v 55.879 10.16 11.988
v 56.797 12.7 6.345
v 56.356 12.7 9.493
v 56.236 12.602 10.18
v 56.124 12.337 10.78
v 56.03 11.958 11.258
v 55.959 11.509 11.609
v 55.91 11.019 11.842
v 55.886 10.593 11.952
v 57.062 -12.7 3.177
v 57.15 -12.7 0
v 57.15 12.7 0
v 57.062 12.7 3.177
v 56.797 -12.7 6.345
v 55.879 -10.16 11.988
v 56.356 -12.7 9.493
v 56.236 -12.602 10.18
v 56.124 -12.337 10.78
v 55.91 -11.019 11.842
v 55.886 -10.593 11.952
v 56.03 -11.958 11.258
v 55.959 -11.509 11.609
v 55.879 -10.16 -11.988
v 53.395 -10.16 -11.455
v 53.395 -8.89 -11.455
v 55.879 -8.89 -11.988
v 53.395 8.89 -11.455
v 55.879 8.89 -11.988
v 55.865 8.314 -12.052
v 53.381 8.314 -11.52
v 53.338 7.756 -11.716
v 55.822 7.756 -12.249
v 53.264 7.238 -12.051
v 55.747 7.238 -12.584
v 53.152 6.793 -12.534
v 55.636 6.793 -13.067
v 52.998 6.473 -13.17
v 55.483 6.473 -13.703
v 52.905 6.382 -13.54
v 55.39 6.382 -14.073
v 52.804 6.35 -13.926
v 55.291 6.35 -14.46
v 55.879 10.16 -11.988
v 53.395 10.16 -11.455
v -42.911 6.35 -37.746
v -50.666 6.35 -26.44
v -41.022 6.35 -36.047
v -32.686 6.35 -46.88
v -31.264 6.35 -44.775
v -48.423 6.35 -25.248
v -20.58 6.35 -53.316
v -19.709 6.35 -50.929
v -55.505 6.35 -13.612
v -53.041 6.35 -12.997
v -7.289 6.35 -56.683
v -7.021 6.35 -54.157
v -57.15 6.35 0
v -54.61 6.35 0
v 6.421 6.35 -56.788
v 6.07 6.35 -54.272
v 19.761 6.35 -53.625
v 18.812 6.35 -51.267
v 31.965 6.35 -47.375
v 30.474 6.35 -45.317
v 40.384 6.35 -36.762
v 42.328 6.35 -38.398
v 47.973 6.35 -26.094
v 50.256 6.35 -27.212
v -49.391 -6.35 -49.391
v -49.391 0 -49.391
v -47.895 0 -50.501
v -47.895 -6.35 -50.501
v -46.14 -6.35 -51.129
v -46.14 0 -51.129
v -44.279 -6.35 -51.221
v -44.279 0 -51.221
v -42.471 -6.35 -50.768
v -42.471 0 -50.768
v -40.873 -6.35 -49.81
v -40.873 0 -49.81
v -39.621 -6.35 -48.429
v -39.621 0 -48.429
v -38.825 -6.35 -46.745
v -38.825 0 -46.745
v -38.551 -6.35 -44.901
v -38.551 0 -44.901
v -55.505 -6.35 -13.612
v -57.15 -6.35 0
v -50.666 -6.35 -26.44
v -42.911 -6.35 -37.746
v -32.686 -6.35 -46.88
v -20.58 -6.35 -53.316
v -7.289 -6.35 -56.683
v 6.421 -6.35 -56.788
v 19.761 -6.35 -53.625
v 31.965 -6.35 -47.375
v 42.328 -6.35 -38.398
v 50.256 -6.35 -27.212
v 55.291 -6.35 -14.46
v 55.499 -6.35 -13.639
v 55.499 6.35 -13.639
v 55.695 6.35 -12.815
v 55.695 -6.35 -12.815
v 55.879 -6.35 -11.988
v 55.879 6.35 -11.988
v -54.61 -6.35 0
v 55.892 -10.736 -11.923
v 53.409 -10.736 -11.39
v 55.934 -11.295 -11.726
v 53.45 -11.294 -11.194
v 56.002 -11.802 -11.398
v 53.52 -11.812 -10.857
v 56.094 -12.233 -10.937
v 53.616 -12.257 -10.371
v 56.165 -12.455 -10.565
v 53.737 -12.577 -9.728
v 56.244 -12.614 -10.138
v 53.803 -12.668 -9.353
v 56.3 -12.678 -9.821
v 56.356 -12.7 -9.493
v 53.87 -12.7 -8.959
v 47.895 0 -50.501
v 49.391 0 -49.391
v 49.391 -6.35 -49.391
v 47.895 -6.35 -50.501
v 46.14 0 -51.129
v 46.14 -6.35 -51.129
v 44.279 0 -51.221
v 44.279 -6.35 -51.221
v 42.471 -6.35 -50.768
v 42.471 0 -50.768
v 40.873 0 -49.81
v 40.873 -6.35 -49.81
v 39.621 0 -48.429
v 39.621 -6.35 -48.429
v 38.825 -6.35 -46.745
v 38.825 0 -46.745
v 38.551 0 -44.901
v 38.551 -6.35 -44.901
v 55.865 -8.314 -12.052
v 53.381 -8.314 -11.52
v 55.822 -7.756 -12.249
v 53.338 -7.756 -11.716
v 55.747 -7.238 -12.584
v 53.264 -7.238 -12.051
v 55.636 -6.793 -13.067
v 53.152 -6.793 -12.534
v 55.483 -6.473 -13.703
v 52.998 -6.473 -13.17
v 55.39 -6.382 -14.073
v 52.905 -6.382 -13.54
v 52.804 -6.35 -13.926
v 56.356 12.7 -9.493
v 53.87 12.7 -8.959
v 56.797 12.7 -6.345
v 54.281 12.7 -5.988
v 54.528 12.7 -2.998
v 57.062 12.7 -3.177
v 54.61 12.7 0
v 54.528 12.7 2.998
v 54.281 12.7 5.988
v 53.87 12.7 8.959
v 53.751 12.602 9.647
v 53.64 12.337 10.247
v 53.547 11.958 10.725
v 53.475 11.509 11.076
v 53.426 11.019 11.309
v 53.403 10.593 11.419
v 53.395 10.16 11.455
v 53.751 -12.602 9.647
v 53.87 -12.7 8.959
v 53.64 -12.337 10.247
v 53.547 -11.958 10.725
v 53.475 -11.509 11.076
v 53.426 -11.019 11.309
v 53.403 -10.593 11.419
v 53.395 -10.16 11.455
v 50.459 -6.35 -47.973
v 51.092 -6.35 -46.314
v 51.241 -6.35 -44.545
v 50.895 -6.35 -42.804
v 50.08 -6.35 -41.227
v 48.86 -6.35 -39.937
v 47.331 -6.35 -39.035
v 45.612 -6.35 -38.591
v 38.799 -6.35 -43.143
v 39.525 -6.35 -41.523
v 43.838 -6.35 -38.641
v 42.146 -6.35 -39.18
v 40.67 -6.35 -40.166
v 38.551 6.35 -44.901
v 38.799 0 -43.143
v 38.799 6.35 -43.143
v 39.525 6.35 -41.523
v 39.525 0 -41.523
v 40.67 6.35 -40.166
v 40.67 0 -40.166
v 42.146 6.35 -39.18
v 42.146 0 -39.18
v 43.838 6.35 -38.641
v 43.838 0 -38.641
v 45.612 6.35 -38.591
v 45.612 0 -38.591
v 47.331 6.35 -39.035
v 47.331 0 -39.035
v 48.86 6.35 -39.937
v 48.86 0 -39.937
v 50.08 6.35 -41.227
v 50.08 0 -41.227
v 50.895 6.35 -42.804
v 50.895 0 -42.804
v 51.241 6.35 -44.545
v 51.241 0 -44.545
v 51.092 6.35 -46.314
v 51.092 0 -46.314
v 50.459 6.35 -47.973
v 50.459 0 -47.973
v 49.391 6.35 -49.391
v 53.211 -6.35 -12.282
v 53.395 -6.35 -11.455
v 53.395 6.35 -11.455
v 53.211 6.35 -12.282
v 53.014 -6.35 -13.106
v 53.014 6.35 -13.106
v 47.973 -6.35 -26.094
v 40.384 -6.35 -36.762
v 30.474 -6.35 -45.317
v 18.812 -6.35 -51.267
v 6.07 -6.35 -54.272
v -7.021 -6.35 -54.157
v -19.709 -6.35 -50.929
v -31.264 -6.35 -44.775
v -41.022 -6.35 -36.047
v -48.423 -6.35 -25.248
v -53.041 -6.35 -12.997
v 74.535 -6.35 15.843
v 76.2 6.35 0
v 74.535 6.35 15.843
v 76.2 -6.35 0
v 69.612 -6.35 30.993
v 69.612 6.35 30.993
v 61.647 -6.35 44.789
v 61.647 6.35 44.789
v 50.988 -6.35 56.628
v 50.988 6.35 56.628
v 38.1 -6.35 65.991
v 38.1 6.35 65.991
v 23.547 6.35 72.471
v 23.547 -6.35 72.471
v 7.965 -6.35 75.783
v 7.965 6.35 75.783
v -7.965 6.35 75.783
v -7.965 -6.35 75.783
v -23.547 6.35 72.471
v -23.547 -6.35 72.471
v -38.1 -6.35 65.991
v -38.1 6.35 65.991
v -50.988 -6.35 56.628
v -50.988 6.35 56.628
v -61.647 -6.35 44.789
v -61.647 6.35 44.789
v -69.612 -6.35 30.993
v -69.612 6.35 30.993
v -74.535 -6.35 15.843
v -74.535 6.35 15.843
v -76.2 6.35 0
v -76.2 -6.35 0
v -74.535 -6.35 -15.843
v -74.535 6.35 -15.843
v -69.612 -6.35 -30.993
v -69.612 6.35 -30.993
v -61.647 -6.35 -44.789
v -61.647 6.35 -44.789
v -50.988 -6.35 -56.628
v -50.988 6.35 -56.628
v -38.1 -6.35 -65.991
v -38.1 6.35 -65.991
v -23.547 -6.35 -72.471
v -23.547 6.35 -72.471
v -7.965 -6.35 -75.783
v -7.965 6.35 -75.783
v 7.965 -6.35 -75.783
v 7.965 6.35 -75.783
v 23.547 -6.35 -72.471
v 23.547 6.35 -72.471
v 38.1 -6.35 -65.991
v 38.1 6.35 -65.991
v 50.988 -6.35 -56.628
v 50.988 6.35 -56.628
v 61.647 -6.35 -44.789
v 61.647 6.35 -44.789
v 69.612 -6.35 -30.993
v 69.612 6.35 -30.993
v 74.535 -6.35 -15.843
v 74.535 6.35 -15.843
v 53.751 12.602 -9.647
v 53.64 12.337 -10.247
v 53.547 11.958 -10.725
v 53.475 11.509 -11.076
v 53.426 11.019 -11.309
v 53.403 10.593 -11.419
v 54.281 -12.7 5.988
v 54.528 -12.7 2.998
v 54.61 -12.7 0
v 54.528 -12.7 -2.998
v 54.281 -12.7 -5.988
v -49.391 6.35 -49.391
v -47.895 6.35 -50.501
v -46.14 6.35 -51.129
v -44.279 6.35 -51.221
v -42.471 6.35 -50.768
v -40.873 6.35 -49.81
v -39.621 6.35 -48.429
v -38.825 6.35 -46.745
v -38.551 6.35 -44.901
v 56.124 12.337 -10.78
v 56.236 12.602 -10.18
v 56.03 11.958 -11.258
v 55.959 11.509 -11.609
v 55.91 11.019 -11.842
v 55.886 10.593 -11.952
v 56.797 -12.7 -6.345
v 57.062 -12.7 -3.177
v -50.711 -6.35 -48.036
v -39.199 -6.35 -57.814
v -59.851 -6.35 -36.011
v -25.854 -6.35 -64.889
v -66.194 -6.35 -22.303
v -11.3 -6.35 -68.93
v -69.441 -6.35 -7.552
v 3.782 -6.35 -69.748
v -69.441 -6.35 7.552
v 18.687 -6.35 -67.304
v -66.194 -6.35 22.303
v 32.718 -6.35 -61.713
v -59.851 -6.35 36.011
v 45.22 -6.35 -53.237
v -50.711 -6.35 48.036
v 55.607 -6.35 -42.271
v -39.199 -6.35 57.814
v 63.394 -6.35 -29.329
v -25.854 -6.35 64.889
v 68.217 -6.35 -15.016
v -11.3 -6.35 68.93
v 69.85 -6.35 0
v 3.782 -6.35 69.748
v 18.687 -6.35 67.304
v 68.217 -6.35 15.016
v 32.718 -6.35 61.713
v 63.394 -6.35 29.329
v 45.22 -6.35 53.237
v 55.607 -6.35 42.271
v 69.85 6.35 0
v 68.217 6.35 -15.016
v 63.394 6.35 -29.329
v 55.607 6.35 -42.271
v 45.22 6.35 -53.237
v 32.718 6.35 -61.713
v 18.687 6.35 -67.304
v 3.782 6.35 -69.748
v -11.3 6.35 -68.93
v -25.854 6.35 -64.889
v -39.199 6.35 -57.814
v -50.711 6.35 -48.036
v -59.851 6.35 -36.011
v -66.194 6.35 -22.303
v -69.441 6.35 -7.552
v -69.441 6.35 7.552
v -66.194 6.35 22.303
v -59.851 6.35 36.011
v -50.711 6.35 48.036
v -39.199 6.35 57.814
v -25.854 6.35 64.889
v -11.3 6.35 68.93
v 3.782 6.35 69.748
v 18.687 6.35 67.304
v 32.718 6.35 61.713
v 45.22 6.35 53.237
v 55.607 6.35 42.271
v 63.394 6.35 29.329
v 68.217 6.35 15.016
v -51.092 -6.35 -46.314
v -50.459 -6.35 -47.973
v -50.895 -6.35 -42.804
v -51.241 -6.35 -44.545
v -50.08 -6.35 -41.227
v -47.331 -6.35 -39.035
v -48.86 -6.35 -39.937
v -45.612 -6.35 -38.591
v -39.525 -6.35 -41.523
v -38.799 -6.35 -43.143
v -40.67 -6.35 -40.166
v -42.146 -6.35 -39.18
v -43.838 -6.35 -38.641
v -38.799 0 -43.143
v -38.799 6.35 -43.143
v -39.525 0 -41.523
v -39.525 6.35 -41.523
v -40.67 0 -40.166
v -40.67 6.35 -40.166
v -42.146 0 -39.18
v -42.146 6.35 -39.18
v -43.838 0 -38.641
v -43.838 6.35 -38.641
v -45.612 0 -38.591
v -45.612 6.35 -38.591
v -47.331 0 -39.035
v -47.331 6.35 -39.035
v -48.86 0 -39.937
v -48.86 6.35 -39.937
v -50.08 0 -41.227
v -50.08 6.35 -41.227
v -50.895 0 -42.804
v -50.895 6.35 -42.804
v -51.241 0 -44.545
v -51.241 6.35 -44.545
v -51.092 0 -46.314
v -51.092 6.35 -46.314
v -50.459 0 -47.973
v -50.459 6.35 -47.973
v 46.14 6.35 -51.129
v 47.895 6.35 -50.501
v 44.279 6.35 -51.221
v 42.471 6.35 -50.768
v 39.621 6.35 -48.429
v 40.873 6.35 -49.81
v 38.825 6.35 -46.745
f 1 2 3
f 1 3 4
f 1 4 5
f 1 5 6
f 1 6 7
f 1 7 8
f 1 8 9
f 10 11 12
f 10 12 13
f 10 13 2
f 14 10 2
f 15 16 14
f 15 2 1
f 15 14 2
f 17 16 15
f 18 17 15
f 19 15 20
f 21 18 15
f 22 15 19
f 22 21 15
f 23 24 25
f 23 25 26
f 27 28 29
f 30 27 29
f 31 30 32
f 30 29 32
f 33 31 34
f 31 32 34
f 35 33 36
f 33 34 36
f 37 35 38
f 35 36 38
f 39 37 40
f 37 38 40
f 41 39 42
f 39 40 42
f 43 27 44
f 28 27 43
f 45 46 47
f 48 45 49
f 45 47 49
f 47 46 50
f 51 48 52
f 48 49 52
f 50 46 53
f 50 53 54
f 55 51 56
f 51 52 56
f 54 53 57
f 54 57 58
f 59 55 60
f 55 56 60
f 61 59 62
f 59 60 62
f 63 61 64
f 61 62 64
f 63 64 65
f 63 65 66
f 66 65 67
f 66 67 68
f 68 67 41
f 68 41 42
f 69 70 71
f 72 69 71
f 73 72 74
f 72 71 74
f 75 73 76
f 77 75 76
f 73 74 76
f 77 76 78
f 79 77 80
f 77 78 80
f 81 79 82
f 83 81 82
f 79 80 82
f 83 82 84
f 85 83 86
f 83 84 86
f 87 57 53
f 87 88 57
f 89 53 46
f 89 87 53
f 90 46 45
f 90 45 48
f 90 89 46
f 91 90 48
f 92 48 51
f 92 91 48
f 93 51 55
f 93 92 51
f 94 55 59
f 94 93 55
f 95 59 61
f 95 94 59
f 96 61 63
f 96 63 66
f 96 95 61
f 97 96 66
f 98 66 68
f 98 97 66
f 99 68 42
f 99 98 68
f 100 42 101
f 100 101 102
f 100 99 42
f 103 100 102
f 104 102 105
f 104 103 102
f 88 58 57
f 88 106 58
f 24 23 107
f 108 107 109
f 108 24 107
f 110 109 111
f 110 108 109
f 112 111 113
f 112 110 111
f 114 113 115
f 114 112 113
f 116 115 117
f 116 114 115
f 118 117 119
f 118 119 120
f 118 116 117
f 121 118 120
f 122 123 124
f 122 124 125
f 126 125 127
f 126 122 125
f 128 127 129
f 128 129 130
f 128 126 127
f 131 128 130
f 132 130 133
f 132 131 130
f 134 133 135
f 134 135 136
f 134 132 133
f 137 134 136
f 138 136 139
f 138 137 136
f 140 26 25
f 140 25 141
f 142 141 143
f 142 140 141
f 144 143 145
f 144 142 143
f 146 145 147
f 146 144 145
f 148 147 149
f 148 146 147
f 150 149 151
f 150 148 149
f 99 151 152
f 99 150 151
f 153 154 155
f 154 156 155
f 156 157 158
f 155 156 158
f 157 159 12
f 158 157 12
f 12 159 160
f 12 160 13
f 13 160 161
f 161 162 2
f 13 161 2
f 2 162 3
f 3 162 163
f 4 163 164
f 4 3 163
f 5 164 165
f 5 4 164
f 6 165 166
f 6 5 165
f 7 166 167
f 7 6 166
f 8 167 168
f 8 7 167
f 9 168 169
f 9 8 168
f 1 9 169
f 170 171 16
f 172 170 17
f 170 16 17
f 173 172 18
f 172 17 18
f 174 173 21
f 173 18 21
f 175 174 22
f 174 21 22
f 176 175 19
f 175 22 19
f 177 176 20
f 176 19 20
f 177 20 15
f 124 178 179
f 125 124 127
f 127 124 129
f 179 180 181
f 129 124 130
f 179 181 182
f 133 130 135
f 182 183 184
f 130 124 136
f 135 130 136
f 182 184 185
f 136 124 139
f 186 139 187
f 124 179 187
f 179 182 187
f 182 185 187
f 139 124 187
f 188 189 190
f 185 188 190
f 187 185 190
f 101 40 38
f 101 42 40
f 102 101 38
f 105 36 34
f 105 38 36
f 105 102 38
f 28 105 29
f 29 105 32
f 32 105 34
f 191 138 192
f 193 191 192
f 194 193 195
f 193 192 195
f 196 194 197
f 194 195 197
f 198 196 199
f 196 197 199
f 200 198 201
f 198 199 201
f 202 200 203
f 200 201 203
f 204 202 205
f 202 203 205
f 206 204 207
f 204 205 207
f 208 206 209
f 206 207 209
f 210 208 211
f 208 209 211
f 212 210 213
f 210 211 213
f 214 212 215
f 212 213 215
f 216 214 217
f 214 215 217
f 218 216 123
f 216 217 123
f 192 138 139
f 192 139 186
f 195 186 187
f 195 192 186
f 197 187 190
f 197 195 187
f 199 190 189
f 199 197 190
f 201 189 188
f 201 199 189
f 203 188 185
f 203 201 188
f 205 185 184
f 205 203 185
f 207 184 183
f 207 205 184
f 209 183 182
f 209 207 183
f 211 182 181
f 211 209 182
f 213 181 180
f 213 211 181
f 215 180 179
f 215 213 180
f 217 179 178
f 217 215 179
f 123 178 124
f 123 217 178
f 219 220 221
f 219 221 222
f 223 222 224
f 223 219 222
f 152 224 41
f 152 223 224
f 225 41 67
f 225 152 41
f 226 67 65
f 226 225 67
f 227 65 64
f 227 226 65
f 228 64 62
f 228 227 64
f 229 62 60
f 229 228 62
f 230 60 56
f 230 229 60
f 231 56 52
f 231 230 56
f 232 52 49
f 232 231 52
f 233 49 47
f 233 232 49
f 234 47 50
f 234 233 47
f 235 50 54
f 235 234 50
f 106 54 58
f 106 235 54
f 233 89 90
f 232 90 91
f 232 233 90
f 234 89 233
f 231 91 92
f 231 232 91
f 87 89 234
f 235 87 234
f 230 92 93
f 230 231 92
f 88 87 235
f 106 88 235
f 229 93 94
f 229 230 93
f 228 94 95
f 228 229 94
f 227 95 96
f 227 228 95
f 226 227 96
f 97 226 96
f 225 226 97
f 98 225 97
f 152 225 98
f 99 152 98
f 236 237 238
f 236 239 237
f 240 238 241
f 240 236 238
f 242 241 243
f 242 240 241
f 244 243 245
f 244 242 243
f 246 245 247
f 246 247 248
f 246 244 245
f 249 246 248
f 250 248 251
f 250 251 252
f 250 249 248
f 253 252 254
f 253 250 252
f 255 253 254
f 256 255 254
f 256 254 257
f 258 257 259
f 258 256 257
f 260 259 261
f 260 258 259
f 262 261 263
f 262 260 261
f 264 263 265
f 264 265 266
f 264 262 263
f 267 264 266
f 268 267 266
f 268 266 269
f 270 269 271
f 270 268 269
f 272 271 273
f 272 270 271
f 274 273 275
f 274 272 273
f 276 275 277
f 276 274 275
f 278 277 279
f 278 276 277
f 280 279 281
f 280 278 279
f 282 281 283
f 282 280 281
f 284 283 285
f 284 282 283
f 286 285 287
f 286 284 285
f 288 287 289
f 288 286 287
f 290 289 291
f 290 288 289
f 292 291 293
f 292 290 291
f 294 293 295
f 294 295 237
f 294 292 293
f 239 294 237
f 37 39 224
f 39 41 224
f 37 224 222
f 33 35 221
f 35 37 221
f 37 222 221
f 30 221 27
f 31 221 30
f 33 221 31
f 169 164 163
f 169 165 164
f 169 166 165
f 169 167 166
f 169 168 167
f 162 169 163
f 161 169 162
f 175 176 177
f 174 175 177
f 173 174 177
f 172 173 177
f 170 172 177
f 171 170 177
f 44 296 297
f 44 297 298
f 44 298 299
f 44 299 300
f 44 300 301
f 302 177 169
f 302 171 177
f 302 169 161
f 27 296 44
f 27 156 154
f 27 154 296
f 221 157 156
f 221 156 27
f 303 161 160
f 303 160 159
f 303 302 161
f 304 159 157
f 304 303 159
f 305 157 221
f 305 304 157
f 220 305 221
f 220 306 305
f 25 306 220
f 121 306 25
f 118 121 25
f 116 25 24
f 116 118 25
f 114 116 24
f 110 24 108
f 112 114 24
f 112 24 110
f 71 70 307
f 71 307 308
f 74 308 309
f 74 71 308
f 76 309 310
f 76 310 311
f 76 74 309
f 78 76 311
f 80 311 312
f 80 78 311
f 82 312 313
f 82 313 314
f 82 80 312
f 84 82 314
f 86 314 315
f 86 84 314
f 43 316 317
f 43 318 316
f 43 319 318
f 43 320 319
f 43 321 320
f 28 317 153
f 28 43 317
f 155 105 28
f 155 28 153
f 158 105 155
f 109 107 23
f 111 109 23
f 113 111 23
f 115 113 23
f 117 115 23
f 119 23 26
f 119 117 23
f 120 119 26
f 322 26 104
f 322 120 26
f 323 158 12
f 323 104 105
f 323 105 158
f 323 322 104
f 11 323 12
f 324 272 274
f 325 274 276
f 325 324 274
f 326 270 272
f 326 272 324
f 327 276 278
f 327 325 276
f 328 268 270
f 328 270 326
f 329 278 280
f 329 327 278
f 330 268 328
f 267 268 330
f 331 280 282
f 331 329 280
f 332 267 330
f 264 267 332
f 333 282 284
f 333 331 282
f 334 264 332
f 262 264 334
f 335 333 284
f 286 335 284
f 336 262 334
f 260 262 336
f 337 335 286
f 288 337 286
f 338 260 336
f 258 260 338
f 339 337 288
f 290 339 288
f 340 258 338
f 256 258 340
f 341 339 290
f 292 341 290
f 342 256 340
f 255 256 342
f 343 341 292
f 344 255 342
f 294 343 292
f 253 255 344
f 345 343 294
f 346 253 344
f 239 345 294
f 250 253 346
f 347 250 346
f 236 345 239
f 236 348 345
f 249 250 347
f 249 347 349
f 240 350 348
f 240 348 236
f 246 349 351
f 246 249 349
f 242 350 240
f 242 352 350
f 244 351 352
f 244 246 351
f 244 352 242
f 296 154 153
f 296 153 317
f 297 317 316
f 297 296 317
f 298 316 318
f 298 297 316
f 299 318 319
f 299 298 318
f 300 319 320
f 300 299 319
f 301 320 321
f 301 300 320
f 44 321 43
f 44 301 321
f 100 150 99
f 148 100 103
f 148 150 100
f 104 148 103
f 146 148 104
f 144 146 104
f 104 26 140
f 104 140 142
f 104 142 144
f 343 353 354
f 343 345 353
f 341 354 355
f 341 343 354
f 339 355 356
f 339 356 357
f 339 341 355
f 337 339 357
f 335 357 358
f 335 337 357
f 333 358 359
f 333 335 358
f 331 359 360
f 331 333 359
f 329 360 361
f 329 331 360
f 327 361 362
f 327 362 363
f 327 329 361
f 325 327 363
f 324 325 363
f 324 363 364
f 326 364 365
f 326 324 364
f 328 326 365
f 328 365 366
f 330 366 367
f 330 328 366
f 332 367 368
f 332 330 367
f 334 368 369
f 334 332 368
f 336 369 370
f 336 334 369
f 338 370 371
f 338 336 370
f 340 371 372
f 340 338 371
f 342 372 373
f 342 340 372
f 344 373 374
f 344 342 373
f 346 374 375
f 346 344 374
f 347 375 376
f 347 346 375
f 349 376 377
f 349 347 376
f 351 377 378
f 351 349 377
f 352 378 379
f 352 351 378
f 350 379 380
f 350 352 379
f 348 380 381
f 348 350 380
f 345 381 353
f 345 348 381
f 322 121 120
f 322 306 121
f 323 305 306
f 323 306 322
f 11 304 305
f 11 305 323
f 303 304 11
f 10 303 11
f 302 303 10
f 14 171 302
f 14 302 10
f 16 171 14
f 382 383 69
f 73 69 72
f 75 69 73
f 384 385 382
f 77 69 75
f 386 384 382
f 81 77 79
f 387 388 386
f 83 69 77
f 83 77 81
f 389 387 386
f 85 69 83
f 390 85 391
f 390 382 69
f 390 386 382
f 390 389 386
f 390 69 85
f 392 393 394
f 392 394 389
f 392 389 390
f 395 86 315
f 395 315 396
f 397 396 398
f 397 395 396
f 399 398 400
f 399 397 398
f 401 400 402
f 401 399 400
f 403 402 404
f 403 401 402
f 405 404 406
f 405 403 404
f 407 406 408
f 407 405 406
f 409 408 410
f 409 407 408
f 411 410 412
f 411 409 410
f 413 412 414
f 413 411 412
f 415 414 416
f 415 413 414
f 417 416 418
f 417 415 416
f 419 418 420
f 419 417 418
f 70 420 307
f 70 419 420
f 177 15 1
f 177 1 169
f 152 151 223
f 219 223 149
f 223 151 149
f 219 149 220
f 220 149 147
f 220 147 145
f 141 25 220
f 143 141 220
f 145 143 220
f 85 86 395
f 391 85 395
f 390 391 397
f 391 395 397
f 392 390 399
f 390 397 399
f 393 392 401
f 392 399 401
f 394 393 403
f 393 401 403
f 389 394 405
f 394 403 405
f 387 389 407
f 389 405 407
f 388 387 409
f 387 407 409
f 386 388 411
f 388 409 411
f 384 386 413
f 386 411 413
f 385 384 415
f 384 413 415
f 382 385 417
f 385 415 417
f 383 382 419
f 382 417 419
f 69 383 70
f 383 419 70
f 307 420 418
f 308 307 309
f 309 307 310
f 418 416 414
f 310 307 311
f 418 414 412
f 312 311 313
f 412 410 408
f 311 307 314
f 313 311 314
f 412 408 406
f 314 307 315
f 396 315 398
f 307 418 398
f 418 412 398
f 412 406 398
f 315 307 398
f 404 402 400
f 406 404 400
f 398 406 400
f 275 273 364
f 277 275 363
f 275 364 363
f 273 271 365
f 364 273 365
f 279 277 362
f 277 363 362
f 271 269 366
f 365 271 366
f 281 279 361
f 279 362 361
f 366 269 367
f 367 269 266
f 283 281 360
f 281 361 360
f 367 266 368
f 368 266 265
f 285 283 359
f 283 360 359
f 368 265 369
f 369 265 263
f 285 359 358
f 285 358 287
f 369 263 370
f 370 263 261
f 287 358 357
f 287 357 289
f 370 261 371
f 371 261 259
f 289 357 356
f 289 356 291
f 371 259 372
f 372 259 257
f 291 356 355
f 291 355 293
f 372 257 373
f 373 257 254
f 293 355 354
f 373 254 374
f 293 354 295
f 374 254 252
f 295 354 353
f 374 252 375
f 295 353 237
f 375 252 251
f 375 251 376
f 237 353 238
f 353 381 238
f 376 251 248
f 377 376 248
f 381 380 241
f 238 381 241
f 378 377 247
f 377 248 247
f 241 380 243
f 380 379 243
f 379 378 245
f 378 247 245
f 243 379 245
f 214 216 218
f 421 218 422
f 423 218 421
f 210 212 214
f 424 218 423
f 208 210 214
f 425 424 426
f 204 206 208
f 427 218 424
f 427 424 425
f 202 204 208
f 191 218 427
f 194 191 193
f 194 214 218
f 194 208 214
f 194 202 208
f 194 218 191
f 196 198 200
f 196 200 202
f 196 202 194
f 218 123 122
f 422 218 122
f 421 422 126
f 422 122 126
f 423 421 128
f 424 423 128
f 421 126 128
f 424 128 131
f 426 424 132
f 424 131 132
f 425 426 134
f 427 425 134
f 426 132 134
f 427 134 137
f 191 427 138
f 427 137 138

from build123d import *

# Parameters (mm, degrees)
F1_R         = 76.2
F2_DEPTH     = 6.35
F5_DEPTH     = 6.35
F6_DEPTH     = 12.7
F7_T4_DEPTH  = 15.24
F7_S5_R      = 54.61
F7_T6_DEPTH  = 10
F7_S7_R      = 57.15
F7_T8_DEPTH  = 10
F7_T12_DEPTH = 15.24
F7_S13_R     = 54.61
F7_T14_DEPTH = 10
F7_S15_R     = 57.15
F7_T16_DEPTH = 10
F7_T17_DEPTH = 15.24
F7_T19_DEPTH = 15.24


# Not quite as in the source:
# - a fillet or chamfer that OpenCascade refuses, or shapes differently, is made with other operations: its cross-section is extruded or revolved along the edge and cut away or added
# - a feature of the source that left no trace in its solid (it failed there, or was rolled back) is left out
# - a pattern or mirror of a feature is missing from the dataset's text; its kind, count and spacing are read off the source's solid


with BuildPart() as f2:
    # F1 (on Front) → F2 (new body, symmetric)
    with BuildSketch(Plane.XZ):
        Circle(F1_R)
        with BuildLine():
            ThreePointArc((-49.3914086403, -49.3914086914), (-26.7304377674, 64.532985339), (69.85, 0))
            ThreePointArc((69.85, 0), (26.7304377674, -64.532985339), (-49.3914086403, -49.3914086914))
        make_face(mode=Mode.SUBTRACT)
    extrude(amount=F2_DEPTH, both=True)


with BuildPart() as f2b:
    # F1 (on Front) → F2, piece 2 (new body, symmetric)
    with BuildSketch(Plane.XZ):
        with BuildLine():
            ThreePointArc((-38.5512806053, -44.9012806053), (-47.3313204176, -39.0346455808), (-49.3914086403, -49.3914086914))
            ThreePointArc((-49.3914086403, -49.3914086914), (-42.4712407931, -50.7679156299), (-38.5512806053, -44.9012806053))
        make_face()
    extrude(amount=F2_DEPTH, both=True)


with BuildPart() as f2_2_copies_1:
    # F2_2_copies: instance of F2b
    add(f2b.part.mirror(Plane(origin=(0, 0, 0), x_dir=(0, 0, 1), z_dir=(1, 0, 0))))


with BuildPart() as f5:
    # F4 (on Front) → F5 (new body, symmetric)
    with BuildSketch(Plane.XZ):
        with BuildLine():
            ThreePointArc((-57.15, 0), (-6.0275497336, -56.831251475), (55.8785614771, -11.9878633311))
            Line((55.8785614771, -11.9878633311), (53.3950698559, -11.4550694053))
            ThreePointArc((53.3950698559, -11.4550694053), (-5.7596586343, -54.3054180761), (-54.61, 0))
            Line((-54.61, 0), (-57.15, 0))
        make_face()
    extrude(amount=F5_DEPTH, both=True)

    # F4 (on Front) → F6 (join, symmetric)
    with BuildSketch(Plane.XZ):
        with BuildLine():
            Line((54.61, 0), (57.15, 0))
            ThreePointArc((57.15, 0), (56.831251475, 6.0275497336), (55.8785614771, 11.9878633311))
            Line((55.8785614771, 11.9878633311), (53.3950698559, 11.4550694053))
            ThreePointArc((53.3950698559, 11.4550694053), (54.3054180761, 5.7596586343), (54.61, 0))
        make_face()
        with BuildLine():
            ThreePointArc((55.8785614771, -11.9878633311), (56.831251475, -6.0275497336), (57.15, 0))
            Line((57.15, 0), (54.61, 0))
            ThreePointArc((54.61, 0), (54.3054180761, -5.7596586343), (53.3950698559, -11.4550694053))
            Line((53.3950698559, -11.4550694053), (55.8785614771, -11.9878633311))
        make_face()
    extrude(amount=F6_DEPTH, both=True)

    # F7: fillet of radius 2.54 on 6 edges, made by hand


with BuildPart() as f7_tool2:
    # F7_s3 → F7_t4 (new body)
    with BuildSketch(Plane(origin=(62.0872905302, 0, -13.3198481457), x_dir=(0, 1, 0), z_dir=(-0.9777526068, 0, 0.2097613881))):
        with BuildLine():
            ThreePointArc((8.89, 0), (7.0939487758, 0.7439487758), (6.35, 2.54))
            Line((6.35, 2.54), (6.35, 0))
            Line((6.35, 0), (8.89, 0))
        make_face()
    extrude(amount=F7_T4_DEPTH)

    # F7_s5 → F7_t6 (cut, symmetric)
    with BuildSketch(Plane.XZ.offset(-7.6)):
        Circle(F7_S5_R)
    extrude(amount=F7_T6_DEPTH, both=True, mode=Mode.SUBTRACT)

    # F7_s7 → F7_t8 (intersect, symmetric)
    with BuildSketch(Plane.XZ.offset(-7.6)):
        Circle(F7_S7_R)
    extrude(amount=F7_T8_DEPTH, both=True, mode=Mode.INTERSECT)


with BuildPart() as f5_1:
    add(f5.part)

    # F7_t1: union F7_tool2
    add(f7_tool2.part)


with BuildPart() as f7_tool10:
    # F7_s11 → F7_t12 (new body)
    with BuildSketch(Plane(origin=(62.0872905302, 0, -13.3198481457), x_dir=(0, 1, 0), z_dir=(-0.9777526068, 0, 0.2097613881))):
        with BuildLine():
            ThreePointArc((-8.89, 0), (-7.0939487758, 0.7439487758), (-6.35, 2.54))
            Line((-6.35, 2.54), (-6.35, 0))
            Line((-6.35, 0), (-8.89, 0))
        make_face()
    extrude(amount=F7_T12_DEPTH)

    # F7_s13 → F7_t14 (cut, symmetric)
    with BuildSketch(Plane.XZ.offset(7.6)):
        Circle(F7_S13_R)
    extrude(amount=F7_T14_DEPTH, both=True, mode=Mode.SUBTRACT)

    # F7_s15 → F7_t16 (intersect, symmetric)
    with BuildSketch(Plane.XZ.offset(7.6)):
        Circle(F7_S15_R)
    extrude(amount=F7_T16_DEPTH, both=True, mode=Mode.INTERSECT)


with BuildPart() as f5_2:
    add(f5_1.part)

    # F7_t9: union F7_tool10
    add(f7_tool10.part)

    # F7_s18 → F7_t17 (cut)
    with BuildSketch(Plane(origin=(47.1863408029, 0, -10.1230845907), x_dir=(0, 1, 0), z_dir=(0.9777526068, 0, -0.2097613881))):
        with BuildLine():
            ThreePointArc((-10.16, 0), (-11.9560512242, 0.7439487758), (-12.7, 2.54))
            Line((-12.7, 2.54), (-12.7, 0))
            Line((-12.7, 0), (-10.16, 0))
        make_face()
        with BuildLine():
            ThreePointArc((12.7, 2.54), (11.9560512242, 0.7439487758), (10.16, 0))
            Line((10.16, 0), (12.7, 0))
            Line((12.7, 0), (12.7, 2.54))
        make_face()
    extrude(amount=F7_T17_DEPTH, mode=Mode.SUBTRACT)

    # F7_s20 → F7_t19 (cut)
    with BuildSketch(Plane(origin=(62.0872905302, 0, 13.3198481457), x_dir=(0, 1, 0), z_dir=(-0.9777526068, 0, -0.2097613881))):
        with BuildLine():
            ThreePointArc((-12.7, 2.54), (-11.9560512242, 0.7439487758), (-10.16, 0))
            Line((-10.16, 0), (-12.7, 0))
            Line((-12.7, 0), (-12.7, 2.54))
        make_face()
        with BuildLine():
            ThreePointArc((12.7, 2.54), (11.9560512242, 0.7439487758), (10.16, 0))
            Line((10.16, 0), (12.7, 0))
            Line((12.7, 0), (12.7, 2.54))
        make_face()
    extrude(amount=F7_T19_DEPTH, mode=Mode.SUBTRACT)


solid = Compound([f2.part, f2b.part, f2_2_copies_1.part, f5_2.part])
